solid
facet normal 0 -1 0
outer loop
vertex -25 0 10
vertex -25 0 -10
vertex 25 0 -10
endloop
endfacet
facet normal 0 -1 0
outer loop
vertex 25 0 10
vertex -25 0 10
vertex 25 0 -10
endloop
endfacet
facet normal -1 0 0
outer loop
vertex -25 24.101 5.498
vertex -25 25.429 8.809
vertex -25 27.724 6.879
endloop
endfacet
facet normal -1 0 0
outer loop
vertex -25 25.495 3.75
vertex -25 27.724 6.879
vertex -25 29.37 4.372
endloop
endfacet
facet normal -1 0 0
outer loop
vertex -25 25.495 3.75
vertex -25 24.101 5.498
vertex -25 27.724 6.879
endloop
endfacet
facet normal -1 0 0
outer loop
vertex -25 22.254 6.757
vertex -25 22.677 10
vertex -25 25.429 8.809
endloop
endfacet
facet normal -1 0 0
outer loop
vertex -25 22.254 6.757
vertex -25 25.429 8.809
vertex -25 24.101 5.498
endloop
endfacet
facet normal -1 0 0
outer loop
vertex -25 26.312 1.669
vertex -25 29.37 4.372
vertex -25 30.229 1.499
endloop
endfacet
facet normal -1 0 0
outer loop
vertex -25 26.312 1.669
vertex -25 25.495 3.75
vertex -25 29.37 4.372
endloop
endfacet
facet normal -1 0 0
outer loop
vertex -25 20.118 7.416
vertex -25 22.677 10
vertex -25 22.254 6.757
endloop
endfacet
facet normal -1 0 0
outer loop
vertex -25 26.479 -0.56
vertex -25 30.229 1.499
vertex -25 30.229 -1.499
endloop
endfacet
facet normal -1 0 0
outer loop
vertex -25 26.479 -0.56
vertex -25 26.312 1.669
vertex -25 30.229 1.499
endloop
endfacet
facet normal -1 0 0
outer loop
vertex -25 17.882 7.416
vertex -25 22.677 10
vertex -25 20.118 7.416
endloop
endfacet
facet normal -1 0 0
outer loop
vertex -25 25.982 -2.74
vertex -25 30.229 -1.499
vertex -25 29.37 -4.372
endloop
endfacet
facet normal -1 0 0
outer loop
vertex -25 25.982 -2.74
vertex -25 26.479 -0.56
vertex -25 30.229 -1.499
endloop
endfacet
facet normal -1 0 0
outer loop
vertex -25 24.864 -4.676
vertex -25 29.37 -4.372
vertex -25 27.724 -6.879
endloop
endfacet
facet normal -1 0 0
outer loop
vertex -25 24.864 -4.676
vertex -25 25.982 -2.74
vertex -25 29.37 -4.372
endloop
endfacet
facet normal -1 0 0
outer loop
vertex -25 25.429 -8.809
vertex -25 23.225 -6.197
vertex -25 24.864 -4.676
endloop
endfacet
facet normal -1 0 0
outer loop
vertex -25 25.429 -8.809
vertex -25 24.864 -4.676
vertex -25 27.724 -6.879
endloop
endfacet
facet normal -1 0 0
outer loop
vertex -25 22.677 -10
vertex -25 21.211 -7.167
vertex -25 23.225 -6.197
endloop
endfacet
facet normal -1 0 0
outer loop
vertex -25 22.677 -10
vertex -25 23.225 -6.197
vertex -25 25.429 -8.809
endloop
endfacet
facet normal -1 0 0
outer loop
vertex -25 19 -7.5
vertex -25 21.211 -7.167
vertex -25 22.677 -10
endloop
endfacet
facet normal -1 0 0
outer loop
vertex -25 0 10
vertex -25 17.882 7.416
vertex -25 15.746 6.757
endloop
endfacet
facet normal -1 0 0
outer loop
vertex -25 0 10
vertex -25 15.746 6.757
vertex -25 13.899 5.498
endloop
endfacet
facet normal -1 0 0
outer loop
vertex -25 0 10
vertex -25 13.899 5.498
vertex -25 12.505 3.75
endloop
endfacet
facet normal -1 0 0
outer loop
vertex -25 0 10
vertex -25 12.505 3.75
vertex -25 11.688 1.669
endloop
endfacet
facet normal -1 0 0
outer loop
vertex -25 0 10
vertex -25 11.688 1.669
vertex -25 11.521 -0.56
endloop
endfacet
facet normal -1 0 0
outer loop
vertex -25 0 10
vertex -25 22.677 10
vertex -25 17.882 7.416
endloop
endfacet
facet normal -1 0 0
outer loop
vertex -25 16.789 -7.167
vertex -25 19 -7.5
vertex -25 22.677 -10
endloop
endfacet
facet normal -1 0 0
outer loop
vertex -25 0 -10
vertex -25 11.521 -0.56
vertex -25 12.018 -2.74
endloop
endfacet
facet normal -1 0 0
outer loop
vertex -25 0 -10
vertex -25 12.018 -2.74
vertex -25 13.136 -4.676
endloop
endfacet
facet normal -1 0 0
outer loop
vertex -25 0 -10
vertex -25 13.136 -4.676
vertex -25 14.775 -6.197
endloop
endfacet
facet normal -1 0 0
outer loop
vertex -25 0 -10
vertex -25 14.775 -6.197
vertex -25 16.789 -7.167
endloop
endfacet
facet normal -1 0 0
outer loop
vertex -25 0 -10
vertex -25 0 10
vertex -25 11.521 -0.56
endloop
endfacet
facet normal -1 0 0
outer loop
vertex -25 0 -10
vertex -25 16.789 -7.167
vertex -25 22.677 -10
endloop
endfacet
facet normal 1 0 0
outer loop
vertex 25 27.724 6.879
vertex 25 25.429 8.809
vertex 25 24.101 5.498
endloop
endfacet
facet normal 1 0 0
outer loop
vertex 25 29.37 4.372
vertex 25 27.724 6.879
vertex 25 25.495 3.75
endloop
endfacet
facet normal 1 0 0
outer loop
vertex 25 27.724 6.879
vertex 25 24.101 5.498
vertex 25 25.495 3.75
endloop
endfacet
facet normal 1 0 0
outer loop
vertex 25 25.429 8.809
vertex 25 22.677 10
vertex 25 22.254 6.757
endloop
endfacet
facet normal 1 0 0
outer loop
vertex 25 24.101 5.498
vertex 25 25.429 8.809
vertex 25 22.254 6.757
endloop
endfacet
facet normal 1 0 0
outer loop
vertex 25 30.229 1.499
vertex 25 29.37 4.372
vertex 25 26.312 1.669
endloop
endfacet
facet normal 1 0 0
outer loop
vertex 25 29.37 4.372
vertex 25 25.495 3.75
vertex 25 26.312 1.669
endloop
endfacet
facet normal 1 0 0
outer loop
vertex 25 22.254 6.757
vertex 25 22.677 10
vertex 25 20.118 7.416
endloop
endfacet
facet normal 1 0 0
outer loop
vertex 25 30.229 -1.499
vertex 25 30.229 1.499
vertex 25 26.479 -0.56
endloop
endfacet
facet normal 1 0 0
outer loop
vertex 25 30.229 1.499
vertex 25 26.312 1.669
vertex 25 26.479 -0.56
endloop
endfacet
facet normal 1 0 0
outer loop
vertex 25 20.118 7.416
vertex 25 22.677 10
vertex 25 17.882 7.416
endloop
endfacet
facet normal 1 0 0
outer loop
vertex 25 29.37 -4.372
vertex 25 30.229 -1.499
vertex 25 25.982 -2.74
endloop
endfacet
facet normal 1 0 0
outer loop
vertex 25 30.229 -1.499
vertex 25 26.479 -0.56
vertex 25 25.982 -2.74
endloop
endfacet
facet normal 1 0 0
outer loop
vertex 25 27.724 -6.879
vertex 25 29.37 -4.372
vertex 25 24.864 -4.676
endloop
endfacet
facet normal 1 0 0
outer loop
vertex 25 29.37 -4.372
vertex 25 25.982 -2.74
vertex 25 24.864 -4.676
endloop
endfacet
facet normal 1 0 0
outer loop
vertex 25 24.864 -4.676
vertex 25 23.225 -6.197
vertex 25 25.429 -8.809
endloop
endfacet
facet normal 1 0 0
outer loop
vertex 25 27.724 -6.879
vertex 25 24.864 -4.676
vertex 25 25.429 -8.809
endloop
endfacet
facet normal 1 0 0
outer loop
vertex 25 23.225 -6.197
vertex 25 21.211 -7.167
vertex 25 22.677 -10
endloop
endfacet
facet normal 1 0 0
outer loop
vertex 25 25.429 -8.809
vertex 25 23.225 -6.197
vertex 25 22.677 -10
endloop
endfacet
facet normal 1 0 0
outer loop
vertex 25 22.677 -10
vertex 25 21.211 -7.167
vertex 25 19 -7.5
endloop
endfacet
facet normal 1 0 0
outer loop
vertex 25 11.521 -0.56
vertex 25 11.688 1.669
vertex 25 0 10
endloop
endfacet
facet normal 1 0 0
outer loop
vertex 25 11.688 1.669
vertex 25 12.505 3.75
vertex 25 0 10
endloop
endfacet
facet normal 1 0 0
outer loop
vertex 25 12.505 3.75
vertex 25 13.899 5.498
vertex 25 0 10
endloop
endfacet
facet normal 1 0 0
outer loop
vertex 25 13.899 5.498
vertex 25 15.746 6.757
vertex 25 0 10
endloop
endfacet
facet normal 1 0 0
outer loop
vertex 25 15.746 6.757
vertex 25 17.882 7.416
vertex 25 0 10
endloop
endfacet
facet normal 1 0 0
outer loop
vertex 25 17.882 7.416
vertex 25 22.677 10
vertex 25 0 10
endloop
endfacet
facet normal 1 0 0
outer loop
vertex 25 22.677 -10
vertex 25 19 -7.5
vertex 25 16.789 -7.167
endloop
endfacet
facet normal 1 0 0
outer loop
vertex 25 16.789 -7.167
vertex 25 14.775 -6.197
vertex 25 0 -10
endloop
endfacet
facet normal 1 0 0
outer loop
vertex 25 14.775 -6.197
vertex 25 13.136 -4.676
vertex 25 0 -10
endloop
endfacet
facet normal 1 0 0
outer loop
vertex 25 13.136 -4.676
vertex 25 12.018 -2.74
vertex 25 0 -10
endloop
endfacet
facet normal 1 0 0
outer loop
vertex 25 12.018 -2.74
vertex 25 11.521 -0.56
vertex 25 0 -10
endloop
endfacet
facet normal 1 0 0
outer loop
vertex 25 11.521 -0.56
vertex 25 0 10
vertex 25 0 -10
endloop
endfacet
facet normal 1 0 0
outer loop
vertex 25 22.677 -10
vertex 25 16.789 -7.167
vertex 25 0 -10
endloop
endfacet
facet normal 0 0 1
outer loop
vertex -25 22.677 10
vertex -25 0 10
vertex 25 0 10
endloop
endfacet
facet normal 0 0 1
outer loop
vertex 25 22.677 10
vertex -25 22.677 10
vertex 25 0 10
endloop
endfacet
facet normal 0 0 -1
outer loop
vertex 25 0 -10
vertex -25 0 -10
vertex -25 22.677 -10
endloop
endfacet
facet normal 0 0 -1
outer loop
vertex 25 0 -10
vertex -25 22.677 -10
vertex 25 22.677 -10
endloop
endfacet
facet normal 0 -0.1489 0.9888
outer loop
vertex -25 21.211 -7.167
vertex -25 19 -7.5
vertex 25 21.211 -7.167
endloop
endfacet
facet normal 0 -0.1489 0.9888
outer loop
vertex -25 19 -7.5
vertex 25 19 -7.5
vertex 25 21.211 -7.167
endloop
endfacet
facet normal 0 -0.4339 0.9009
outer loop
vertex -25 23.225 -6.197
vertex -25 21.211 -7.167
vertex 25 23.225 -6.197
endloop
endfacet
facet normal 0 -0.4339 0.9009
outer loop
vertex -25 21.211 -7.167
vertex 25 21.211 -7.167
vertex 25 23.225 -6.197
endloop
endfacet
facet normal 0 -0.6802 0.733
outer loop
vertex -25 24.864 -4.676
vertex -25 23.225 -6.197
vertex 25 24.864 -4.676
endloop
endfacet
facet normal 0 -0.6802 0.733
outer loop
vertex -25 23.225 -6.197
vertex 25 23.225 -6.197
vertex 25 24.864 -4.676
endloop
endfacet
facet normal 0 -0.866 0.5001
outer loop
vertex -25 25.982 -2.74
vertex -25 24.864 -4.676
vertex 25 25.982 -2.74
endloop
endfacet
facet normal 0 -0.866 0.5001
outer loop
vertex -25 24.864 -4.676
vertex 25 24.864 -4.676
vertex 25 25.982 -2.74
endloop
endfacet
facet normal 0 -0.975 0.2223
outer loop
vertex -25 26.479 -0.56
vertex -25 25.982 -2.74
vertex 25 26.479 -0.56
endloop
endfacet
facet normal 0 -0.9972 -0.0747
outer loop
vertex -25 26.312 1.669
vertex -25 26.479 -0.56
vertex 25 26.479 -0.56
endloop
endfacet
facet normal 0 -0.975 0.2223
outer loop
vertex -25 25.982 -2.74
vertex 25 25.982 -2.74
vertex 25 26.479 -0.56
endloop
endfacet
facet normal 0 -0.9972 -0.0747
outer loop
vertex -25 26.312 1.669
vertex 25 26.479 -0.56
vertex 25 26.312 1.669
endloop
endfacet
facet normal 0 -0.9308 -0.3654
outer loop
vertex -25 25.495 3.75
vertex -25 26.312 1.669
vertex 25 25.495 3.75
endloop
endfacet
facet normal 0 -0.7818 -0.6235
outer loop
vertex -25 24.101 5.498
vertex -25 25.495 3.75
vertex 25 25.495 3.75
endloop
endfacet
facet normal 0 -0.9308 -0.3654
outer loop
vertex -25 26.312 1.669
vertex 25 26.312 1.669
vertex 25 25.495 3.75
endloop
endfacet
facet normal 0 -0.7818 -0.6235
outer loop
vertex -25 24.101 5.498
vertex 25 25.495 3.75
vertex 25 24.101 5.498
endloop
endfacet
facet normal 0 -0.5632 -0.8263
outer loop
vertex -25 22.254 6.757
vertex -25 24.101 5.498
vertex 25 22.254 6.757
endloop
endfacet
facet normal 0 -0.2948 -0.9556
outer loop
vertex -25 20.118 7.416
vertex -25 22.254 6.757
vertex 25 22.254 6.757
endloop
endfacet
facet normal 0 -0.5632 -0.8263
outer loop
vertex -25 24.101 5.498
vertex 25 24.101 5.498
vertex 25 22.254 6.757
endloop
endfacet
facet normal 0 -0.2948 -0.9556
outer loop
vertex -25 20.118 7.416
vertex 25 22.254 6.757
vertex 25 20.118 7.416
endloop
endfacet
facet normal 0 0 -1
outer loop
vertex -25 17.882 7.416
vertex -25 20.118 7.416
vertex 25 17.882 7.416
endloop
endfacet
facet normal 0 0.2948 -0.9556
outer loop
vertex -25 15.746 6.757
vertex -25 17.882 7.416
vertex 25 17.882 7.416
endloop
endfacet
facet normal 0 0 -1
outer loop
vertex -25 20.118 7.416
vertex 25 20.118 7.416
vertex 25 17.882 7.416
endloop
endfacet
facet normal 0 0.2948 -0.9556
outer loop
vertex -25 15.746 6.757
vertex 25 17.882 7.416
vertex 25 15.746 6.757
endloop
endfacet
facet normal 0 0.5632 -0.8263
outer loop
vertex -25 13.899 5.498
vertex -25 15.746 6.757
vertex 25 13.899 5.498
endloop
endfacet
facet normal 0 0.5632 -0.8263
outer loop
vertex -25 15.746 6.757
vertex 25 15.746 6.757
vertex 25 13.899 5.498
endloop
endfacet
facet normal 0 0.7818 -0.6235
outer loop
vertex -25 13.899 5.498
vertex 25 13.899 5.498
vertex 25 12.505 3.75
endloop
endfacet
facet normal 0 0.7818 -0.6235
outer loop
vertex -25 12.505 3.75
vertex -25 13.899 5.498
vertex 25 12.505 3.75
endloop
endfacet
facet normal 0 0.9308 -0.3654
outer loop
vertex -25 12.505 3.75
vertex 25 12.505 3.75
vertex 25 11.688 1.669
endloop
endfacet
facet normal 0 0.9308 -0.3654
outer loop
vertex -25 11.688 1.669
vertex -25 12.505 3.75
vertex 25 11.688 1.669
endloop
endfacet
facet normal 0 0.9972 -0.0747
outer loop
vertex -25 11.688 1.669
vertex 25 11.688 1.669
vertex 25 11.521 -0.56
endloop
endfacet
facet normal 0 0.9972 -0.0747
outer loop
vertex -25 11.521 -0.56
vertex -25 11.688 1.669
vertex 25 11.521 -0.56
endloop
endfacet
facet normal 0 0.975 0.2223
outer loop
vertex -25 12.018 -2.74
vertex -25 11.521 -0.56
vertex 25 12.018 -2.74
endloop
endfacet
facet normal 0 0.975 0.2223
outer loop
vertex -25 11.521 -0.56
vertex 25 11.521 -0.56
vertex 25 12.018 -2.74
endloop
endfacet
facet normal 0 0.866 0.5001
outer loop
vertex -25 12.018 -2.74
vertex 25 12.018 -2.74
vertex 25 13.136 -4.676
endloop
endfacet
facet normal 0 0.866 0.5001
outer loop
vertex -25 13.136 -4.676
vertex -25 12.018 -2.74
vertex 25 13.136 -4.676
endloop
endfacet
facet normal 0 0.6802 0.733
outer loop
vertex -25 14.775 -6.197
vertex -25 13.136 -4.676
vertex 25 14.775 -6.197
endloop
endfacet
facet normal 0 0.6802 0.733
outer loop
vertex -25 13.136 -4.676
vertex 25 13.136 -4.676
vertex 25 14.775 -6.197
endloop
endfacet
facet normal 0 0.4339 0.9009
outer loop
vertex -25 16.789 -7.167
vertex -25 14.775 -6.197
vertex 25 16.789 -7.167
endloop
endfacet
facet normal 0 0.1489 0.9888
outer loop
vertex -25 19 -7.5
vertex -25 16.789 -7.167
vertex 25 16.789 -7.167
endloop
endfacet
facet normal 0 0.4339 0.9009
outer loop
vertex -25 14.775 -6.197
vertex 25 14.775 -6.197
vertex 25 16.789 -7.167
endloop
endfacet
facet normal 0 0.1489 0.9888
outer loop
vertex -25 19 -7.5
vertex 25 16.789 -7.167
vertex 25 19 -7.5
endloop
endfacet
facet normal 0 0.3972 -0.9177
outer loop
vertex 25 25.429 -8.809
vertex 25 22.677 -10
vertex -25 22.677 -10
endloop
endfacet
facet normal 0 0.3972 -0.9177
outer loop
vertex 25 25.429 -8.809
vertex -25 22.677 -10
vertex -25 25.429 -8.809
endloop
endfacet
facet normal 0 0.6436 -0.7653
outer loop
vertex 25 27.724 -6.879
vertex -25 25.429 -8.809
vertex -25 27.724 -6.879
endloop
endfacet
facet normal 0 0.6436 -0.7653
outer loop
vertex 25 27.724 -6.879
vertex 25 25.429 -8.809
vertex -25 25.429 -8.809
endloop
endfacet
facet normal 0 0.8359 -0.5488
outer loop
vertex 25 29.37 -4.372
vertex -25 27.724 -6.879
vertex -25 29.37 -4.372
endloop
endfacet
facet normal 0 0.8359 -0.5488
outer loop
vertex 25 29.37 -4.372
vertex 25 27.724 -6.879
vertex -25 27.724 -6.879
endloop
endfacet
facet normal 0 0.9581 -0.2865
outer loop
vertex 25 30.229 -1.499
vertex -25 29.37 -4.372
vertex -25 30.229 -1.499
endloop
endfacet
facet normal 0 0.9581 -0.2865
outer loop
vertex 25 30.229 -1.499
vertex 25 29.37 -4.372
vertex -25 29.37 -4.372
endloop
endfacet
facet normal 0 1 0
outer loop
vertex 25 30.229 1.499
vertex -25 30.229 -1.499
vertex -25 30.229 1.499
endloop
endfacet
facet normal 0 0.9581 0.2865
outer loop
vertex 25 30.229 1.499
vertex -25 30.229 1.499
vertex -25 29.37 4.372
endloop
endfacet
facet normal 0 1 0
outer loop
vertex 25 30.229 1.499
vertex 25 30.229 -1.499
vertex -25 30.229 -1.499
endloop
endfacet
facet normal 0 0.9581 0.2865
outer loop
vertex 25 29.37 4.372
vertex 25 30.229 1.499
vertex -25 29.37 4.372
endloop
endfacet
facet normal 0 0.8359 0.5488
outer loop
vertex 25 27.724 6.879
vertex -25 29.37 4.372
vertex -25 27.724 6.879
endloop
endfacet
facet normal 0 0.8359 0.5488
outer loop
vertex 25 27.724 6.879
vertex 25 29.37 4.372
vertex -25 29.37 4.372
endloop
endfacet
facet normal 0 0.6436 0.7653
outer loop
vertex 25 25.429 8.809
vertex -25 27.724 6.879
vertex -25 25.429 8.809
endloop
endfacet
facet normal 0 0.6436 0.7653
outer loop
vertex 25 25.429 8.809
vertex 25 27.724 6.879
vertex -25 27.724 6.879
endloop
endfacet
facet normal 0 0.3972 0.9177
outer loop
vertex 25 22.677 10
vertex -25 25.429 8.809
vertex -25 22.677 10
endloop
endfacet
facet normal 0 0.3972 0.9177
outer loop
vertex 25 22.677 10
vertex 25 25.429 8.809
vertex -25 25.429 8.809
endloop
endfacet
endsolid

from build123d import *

# Parameters (mm, degrees)
SKETCH1_W               = 50
SKETCH1_H               = 20
BOSS_EXTRUDE1_DEPTH     = 44
SKETCH3_R               = 7.5
CUT_EXTRUDE3_DEPTH      = 26
CUT_EXTRUDE3_DEPTH_BACK = 26
CUT_EXTRUDE4_DEPTH      = 26
CUT_EXTRUDE4_DEPTH_BACK = 26


with BuildPart() as part:
    # Sketch1 → Boss-Extrude1 (new body)
    with BuildSketch(Plane(origin=(0, 0, 0), x_dir=(1, 0, 0), z_dir=(0, 1, 0))):
        Rectangle(SKETCH1_W, SKETCH1_H)
    extrude(amount=BOSS_EXTRUDE1_DEPTH)

    # Sketch3 → Cut-Extrude3 (cut, two sides)
    with BuildSketch(Plane(origin=(0, 0, 0), x_dir=(0, 0, -1), z_dir=(1, 0, 0))) as cut_extrude3_sk:
        with Locations((0, 19)):
            Circle(SKETCH3_R)
    extrude(amount=CUT_EXTRUDE3_DEPTH, mode=Mode.SUBTRACT)
    extrude(cut_extrude3_sk.sketch, amount=-CUT_EXTRUDE3_DEPTH_BACK, mode=Mode.SUBTRACT)

    # Sketch4 → Cut-Extrude4 (cut, two sides)
    with BuildSketch(Plane(origin=(0, 0, 0), x_dir=(0, 0, -1), z_dir=(1, 0, 0))) as cut_extrude4_sk:
        with BuildLine():
            Line((-10, 22.677289201), (-10, 44))
            Line((-10, 44), (10, 44))
            Line((10, 44), (10, 22.677289201))
            ThreePointArc((10, 22.677289201), (0, 30.338307173), (-10, 22.677289201))
        make_face()
    extrude(amount=CUT_EXTRUDE4_DEPTH, mode=Mode.SUBTRACT)
    extrude(cut_extrude4_sk.sketch, amount=-CUT_EXTRUDE4_DEPTH_BACK, mode=Mode.SUBTRACT)


solid = part.part
